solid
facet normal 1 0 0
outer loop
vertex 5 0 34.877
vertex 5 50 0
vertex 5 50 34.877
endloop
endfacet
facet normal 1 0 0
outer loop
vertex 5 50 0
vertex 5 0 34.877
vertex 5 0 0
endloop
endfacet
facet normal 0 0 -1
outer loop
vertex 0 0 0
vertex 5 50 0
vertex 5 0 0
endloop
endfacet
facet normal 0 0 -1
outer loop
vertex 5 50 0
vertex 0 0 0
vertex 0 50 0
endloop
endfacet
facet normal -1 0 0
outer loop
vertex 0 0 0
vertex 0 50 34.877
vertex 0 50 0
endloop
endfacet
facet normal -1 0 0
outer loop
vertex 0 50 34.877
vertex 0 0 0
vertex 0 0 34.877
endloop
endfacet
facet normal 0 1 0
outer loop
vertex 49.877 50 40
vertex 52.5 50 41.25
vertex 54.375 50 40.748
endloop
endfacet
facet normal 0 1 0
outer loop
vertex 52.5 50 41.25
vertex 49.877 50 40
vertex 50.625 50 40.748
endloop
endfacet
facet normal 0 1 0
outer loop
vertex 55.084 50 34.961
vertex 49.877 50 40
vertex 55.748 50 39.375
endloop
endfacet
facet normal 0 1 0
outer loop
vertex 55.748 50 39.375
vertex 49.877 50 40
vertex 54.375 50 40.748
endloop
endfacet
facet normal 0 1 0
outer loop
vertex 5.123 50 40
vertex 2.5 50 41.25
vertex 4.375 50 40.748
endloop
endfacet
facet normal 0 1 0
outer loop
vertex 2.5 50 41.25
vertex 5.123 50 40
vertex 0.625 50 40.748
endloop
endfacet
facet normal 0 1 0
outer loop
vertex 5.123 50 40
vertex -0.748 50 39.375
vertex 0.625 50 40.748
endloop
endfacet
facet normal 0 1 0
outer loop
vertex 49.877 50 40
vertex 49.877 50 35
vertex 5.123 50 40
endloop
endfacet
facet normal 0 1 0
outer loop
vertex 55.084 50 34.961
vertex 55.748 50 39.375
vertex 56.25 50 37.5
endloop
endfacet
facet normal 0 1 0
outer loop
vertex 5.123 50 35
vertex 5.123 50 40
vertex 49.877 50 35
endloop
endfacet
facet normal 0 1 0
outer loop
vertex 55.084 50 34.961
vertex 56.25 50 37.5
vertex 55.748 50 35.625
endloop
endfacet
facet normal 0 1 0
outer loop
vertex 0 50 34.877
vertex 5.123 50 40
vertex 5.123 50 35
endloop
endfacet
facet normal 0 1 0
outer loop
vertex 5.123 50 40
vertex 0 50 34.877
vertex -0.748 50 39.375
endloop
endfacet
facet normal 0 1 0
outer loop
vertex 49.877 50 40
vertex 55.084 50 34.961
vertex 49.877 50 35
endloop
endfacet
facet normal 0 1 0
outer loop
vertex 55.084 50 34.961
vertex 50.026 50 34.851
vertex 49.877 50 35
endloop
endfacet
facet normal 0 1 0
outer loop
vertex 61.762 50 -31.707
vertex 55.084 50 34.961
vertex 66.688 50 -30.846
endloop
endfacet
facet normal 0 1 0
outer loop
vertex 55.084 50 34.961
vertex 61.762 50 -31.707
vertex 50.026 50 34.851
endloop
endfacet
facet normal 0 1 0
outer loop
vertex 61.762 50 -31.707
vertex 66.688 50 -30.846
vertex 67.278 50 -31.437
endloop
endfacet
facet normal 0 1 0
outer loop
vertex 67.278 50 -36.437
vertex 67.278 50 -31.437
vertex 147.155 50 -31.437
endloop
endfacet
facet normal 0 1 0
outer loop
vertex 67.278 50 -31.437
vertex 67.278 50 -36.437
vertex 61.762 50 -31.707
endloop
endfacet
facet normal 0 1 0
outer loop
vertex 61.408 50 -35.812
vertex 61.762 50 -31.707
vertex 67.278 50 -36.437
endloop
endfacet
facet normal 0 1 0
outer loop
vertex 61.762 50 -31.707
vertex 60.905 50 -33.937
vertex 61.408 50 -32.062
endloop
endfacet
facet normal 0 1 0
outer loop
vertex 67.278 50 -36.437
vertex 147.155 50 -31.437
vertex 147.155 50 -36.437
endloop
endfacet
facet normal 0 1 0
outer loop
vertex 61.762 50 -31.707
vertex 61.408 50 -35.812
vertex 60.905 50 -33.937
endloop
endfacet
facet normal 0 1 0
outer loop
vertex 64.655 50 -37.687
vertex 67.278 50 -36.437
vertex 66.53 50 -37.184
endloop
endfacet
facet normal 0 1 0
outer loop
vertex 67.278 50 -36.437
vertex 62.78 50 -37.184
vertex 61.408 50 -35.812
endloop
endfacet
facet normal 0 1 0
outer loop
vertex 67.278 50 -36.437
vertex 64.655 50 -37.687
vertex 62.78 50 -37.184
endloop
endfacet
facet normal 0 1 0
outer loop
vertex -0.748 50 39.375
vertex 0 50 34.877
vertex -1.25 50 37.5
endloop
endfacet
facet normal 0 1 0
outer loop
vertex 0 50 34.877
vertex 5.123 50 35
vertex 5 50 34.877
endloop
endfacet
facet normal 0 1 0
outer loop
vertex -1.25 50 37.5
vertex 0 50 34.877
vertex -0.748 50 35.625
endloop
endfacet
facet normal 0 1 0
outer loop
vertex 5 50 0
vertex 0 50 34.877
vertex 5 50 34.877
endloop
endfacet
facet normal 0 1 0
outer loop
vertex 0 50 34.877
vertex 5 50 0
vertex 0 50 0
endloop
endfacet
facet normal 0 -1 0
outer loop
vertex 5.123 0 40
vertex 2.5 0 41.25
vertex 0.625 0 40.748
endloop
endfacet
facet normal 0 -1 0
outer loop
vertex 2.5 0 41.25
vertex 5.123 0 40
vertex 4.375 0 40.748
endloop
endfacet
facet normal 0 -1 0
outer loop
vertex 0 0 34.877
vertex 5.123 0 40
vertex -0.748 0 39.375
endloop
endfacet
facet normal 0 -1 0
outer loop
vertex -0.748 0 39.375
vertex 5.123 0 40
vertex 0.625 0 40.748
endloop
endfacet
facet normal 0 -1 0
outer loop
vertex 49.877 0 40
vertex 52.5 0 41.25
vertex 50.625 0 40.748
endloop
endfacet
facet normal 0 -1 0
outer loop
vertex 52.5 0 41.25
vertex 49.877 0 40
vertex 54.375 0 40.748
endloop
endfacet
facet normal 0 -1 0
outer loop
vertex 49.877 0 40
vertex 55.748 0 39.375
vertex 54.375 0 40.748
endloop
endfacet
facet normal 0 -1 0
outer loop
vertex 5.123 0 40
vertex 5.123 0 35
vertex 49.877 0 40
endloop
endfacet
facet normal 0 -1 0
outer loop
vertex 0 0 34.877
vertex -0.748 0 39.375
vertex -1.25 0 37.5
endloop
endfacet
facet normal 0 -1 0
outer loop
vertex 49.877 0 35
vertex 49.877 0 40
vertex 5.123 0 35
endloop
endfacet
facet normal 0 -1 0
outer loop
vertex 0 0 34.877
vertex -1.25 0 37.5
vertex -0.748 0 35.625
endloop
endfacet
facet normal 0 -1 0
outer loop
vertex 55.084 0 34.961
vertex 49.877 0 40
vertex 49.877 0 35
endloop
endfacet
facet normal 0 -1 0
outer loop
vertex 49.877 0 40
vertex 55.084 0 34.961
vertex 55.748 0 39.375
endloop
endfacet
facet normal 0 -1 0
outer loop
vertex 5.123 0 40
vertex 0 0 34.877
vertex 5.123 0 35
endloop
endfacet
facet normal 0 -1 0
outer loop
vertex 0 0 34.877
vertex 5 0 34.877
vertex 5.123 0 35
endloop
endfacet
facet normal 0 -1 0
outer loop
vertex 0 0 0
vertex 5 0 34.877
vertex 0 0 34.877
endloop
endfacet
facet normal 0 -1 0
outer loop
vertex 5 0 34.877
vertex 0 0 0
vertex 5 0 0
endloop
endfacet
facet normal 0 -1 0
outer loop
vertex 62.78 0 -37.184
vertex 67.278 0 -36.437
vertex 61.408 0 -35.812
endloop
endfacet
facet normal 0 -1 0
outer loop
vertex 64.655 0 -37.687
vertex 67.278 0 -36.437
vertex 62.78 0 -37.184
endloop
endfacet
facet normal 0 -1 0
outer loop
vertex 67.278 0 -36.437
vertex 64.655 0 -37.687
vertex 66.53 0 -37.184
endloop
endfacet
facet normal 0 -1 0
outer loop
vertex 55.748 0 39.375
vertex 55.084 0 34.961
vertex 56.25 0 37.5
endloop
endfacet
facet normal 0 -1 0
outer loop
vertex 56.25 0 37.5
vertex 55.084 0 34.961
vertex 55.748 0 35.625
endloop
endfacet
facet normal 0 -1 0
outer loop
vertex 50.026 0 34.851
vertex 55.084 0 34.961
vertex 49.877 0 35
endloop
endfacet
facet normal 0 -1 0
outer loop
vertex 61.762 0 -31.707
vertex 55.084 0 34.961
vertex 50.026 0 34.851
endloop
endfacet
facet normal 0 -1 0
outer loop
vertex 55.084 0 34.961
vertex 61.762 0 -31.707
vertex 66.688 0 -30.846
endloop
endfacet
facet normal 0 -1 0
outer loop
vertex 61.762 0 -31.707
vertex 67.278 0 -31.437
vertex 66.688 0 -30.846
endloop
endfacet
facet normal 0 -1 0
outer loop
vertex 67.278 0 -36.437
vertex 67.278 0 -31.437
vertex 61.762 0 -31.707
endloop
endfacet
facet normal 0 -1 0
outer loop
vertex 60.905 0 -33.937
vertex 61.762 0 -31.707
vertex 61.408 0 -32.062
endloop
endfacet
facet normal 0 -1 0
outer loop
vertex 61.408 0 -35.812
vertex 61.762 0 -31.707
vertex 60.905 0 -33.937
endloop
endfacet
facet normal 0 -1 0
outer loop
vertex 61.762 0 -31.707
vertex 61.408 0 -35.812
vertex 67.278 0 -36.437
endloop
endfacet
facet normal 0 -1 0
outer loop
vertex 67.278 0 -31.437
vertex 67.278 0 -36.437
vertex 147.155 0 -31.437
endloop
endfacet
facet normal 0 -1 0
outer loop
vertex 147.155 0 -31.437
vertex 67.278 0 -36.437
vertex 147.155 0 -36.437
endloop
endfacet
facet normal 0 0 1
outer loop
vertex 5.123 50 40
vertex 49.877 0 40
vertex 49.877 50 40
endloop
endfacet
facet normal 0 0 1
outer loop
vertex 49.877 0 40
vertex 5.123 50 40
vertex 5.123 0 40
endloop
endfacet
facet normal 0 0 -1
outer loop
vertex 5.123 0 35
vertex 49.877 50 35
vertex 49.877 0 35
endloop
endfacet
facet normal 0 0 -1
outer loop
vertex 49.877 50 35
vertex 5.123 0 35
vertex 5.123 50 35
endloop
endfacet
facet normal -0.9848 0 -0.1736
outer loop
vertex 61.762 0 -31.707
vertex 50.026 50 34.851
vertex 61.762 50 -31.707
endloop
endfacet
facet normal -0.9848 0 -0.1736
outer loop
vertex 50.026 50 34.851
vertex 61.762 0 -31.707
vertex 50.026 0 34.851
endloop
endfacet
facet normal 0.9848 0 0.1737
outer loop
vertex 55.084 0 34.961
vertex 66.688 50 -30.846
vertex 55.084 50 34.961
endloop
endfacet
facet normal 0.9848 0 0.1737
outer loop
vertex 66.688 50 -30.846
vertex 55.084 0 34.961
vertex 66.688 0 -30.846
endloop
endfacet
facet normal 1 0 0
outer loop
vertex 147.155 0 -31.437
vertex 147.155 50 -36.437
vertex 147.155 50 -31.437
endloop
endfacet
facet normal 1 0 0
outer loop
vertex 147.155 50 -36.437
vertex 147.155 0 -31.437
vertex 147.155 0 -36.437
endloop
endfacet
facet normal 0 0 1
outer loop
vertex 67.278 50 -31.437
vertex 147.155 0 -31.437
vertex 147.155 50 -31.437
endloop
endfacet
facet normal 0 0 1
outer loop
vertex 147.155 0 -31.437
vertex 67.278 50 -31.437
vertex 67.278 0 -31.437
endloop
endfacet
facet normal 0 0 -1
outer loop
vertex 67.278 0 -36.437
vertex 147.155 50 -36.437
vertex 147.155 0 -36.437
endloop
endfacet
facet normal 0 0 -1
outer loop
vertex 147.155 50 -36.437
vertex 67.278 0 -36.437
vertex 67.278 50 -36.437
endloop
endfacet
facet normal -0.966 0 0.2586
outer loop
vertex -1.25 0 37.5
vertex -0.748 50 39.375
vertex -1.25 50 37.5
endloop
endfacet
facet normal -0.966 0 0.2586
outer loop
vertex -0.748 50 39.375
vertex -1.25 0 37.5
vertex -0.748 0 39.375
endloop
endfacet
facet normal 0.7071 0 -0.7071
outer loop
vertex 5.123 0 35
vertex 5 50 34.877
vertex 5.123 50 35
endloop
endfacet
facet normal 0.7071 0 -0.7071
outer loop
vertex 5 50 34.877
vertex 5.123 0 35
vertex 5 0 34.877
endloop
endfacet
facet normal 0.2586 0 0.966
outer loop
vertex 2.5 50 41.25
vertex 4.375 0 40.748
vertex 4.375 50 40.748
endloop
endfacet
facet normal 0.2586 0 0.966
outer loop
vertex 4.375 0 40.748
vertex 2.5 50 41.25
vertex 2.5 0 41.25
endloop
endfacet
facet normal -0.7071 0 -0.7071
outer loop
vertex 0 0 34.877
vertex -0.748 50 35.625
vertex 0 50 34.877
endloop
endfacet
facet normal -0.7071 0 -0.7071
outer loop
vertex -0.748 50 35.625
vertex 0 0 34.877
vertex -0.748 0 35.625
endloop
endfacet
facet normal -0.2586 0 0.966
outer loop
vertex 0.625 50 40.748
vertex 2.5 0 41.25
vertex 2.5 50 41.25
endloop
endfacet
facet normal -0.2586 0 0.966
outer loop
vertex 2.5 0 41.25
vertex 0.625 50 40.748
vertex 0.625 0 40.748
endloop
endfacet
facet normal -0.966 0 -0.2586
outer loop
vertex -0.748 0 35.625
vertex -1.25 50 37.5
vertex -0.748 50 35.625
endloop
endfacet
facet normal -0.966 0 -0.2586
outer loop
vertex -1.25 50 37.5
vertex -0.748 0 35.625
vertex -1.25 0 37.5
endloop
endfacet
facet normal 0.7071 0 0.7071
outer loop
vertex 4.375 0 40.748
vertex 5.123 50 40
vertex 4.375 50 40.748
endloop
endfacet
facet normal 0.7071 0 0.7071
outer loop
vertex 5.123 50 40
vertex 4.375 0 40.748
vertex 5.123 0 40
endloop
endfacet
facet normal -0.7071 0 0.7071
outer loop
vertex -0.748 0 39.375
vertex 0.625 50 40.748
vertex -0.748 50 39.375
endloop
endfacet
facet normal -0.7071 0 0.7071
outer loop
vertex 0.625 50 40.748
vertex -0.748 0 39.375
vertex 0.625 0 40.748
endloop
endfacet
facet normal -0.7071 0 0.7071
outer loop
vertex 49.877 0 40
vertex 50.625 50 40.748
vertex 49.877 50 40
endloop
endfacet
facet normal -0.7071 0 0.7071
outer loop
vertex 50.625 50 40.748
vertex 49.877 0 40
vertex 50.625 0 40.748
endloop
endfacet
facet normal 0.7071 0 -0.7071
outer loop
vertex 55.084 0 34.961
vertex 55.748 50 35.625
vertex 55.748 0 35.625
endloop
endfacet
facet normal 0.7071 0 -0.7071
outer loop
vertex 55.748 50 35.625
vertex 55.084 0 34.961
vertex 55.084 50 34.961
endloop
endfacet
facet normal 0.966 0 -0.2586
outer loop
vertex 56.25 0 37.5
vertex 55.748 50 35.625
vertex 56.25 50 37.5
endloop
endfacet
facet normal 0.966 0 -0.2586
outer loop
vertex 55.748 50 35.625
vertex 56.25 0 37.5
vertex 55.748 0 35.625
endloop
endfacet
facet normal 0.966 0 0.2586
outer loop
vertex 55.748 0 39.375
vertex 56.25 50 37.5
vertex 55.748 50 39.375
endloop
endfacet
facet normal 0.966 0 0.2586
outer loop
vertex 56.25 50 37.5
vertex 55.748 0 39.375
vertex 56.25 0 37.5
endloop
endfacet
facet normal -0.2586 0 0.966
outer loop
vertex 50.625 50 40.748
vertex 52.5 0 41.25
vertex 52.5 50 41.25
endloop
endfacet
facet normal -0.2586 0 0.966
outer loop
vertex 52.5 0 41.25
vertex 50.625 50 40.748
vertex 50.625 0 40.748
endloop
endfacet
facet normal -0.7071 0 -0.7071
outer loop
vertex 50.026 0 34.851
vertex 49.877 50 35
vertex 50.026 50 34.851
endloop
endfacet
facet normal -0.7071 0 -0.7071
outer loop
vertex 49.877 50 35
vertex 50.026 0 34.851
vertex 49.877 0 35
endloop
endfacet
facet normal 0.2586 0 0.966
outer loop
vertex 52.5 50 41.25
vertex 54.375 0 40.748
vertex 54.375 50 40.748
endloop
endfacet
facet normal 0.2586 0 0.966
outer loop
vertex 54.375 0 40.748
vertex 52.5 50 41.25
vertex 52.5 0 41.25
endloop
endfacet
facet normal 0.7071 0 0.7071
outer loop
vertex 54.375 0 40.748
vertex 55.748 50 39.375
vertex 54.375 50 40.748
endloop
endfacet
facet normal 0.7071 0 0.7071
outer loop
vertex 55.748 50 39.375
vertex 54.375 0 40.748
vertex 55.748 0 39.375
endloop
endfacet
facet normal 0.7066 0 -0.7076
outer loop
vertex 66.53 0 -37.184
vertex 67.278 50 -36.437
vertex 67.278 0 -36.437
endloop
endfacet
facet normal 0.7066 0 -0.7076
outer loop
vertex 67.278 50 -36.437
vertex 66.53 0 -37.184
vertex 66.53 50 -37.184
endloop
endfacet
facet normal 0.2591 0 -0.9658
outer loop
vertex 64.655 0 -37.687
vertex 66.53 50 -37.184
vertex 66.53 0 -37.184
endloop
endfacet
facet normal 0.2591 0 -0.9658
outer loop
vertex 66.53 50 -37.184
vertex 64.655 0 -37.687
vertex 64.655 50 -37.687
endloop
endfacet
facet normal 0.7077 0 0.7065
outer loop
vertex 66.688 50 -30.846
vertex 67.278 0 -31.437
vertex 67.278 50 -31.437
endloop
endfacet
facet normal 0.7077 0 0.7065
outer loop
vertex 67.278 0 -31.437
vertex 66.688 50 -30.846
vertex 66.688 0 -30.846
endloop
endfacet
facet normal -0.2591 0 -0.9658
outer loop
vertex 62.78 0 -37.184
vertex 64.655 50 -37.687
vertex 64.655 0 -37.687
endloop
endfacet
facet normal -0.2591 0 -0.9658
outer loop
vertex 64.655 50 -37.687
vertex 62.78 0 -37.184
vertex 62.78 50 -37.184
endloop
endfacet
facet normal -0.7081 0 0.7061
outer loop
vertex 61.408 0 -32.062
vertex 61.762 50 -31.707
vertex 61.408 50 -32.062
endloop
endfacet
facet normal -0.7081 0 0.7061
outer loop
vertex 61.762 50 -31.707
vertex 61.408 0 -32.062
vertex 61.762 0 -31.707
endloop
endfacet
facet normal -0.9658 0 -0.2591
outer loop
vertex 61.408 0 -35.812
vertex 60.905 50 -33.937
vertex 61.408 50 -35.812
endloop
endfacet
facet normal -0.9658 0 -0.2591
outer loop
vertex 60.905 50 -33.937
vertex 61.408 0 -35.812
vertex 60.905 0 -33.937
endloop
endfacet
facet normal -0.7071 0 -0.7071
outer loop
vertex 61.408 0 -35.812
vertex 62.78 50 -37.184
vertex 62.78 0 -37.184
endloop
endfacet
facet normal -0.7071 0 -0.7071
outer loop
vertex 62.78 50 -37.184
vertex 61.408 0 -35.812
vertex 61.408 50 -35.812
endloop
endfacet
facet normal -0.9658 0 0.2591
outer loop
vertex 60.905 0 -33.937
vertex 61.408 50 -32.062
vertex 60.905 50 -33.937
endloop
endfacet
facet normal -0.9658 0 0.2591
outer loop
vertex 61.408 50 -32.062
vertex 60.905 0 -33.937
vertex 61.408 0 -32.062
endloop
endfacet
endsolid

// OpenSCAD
width=50;
thickness=5;
angle=10;
a=35;
b=45;
c=70;
d=70;

cube([thickness,width,a]);

translate([thickness,0,a]) { 
  cube([b,width,thickness]);
};
    

translate([b+thickness,0,a]) { 
    rotate(a=180-angle,v=[0,1,0]) { 
    translate([-thickness,0,0]) cube([thickness,width,c]); 
  };
};

translate([b+2*thickness+c*sin(angle),0,a-(c*cos(angle)+thickness/2)]) { 
  cube([d+2*thickness,width,thickness]);
};


glue(0,a);
glue(b+thickness,a);
glue(b+sin(angle)*c+thickness,a-(c*cos(angle)+thickness/2));


module glue(x,z) {
  translate([x+thickness/2,0,z+thickness/2]) rotate(a=-90,v=[1,0,0]) cylinder(h=width,d=thickness*1.5);
}
